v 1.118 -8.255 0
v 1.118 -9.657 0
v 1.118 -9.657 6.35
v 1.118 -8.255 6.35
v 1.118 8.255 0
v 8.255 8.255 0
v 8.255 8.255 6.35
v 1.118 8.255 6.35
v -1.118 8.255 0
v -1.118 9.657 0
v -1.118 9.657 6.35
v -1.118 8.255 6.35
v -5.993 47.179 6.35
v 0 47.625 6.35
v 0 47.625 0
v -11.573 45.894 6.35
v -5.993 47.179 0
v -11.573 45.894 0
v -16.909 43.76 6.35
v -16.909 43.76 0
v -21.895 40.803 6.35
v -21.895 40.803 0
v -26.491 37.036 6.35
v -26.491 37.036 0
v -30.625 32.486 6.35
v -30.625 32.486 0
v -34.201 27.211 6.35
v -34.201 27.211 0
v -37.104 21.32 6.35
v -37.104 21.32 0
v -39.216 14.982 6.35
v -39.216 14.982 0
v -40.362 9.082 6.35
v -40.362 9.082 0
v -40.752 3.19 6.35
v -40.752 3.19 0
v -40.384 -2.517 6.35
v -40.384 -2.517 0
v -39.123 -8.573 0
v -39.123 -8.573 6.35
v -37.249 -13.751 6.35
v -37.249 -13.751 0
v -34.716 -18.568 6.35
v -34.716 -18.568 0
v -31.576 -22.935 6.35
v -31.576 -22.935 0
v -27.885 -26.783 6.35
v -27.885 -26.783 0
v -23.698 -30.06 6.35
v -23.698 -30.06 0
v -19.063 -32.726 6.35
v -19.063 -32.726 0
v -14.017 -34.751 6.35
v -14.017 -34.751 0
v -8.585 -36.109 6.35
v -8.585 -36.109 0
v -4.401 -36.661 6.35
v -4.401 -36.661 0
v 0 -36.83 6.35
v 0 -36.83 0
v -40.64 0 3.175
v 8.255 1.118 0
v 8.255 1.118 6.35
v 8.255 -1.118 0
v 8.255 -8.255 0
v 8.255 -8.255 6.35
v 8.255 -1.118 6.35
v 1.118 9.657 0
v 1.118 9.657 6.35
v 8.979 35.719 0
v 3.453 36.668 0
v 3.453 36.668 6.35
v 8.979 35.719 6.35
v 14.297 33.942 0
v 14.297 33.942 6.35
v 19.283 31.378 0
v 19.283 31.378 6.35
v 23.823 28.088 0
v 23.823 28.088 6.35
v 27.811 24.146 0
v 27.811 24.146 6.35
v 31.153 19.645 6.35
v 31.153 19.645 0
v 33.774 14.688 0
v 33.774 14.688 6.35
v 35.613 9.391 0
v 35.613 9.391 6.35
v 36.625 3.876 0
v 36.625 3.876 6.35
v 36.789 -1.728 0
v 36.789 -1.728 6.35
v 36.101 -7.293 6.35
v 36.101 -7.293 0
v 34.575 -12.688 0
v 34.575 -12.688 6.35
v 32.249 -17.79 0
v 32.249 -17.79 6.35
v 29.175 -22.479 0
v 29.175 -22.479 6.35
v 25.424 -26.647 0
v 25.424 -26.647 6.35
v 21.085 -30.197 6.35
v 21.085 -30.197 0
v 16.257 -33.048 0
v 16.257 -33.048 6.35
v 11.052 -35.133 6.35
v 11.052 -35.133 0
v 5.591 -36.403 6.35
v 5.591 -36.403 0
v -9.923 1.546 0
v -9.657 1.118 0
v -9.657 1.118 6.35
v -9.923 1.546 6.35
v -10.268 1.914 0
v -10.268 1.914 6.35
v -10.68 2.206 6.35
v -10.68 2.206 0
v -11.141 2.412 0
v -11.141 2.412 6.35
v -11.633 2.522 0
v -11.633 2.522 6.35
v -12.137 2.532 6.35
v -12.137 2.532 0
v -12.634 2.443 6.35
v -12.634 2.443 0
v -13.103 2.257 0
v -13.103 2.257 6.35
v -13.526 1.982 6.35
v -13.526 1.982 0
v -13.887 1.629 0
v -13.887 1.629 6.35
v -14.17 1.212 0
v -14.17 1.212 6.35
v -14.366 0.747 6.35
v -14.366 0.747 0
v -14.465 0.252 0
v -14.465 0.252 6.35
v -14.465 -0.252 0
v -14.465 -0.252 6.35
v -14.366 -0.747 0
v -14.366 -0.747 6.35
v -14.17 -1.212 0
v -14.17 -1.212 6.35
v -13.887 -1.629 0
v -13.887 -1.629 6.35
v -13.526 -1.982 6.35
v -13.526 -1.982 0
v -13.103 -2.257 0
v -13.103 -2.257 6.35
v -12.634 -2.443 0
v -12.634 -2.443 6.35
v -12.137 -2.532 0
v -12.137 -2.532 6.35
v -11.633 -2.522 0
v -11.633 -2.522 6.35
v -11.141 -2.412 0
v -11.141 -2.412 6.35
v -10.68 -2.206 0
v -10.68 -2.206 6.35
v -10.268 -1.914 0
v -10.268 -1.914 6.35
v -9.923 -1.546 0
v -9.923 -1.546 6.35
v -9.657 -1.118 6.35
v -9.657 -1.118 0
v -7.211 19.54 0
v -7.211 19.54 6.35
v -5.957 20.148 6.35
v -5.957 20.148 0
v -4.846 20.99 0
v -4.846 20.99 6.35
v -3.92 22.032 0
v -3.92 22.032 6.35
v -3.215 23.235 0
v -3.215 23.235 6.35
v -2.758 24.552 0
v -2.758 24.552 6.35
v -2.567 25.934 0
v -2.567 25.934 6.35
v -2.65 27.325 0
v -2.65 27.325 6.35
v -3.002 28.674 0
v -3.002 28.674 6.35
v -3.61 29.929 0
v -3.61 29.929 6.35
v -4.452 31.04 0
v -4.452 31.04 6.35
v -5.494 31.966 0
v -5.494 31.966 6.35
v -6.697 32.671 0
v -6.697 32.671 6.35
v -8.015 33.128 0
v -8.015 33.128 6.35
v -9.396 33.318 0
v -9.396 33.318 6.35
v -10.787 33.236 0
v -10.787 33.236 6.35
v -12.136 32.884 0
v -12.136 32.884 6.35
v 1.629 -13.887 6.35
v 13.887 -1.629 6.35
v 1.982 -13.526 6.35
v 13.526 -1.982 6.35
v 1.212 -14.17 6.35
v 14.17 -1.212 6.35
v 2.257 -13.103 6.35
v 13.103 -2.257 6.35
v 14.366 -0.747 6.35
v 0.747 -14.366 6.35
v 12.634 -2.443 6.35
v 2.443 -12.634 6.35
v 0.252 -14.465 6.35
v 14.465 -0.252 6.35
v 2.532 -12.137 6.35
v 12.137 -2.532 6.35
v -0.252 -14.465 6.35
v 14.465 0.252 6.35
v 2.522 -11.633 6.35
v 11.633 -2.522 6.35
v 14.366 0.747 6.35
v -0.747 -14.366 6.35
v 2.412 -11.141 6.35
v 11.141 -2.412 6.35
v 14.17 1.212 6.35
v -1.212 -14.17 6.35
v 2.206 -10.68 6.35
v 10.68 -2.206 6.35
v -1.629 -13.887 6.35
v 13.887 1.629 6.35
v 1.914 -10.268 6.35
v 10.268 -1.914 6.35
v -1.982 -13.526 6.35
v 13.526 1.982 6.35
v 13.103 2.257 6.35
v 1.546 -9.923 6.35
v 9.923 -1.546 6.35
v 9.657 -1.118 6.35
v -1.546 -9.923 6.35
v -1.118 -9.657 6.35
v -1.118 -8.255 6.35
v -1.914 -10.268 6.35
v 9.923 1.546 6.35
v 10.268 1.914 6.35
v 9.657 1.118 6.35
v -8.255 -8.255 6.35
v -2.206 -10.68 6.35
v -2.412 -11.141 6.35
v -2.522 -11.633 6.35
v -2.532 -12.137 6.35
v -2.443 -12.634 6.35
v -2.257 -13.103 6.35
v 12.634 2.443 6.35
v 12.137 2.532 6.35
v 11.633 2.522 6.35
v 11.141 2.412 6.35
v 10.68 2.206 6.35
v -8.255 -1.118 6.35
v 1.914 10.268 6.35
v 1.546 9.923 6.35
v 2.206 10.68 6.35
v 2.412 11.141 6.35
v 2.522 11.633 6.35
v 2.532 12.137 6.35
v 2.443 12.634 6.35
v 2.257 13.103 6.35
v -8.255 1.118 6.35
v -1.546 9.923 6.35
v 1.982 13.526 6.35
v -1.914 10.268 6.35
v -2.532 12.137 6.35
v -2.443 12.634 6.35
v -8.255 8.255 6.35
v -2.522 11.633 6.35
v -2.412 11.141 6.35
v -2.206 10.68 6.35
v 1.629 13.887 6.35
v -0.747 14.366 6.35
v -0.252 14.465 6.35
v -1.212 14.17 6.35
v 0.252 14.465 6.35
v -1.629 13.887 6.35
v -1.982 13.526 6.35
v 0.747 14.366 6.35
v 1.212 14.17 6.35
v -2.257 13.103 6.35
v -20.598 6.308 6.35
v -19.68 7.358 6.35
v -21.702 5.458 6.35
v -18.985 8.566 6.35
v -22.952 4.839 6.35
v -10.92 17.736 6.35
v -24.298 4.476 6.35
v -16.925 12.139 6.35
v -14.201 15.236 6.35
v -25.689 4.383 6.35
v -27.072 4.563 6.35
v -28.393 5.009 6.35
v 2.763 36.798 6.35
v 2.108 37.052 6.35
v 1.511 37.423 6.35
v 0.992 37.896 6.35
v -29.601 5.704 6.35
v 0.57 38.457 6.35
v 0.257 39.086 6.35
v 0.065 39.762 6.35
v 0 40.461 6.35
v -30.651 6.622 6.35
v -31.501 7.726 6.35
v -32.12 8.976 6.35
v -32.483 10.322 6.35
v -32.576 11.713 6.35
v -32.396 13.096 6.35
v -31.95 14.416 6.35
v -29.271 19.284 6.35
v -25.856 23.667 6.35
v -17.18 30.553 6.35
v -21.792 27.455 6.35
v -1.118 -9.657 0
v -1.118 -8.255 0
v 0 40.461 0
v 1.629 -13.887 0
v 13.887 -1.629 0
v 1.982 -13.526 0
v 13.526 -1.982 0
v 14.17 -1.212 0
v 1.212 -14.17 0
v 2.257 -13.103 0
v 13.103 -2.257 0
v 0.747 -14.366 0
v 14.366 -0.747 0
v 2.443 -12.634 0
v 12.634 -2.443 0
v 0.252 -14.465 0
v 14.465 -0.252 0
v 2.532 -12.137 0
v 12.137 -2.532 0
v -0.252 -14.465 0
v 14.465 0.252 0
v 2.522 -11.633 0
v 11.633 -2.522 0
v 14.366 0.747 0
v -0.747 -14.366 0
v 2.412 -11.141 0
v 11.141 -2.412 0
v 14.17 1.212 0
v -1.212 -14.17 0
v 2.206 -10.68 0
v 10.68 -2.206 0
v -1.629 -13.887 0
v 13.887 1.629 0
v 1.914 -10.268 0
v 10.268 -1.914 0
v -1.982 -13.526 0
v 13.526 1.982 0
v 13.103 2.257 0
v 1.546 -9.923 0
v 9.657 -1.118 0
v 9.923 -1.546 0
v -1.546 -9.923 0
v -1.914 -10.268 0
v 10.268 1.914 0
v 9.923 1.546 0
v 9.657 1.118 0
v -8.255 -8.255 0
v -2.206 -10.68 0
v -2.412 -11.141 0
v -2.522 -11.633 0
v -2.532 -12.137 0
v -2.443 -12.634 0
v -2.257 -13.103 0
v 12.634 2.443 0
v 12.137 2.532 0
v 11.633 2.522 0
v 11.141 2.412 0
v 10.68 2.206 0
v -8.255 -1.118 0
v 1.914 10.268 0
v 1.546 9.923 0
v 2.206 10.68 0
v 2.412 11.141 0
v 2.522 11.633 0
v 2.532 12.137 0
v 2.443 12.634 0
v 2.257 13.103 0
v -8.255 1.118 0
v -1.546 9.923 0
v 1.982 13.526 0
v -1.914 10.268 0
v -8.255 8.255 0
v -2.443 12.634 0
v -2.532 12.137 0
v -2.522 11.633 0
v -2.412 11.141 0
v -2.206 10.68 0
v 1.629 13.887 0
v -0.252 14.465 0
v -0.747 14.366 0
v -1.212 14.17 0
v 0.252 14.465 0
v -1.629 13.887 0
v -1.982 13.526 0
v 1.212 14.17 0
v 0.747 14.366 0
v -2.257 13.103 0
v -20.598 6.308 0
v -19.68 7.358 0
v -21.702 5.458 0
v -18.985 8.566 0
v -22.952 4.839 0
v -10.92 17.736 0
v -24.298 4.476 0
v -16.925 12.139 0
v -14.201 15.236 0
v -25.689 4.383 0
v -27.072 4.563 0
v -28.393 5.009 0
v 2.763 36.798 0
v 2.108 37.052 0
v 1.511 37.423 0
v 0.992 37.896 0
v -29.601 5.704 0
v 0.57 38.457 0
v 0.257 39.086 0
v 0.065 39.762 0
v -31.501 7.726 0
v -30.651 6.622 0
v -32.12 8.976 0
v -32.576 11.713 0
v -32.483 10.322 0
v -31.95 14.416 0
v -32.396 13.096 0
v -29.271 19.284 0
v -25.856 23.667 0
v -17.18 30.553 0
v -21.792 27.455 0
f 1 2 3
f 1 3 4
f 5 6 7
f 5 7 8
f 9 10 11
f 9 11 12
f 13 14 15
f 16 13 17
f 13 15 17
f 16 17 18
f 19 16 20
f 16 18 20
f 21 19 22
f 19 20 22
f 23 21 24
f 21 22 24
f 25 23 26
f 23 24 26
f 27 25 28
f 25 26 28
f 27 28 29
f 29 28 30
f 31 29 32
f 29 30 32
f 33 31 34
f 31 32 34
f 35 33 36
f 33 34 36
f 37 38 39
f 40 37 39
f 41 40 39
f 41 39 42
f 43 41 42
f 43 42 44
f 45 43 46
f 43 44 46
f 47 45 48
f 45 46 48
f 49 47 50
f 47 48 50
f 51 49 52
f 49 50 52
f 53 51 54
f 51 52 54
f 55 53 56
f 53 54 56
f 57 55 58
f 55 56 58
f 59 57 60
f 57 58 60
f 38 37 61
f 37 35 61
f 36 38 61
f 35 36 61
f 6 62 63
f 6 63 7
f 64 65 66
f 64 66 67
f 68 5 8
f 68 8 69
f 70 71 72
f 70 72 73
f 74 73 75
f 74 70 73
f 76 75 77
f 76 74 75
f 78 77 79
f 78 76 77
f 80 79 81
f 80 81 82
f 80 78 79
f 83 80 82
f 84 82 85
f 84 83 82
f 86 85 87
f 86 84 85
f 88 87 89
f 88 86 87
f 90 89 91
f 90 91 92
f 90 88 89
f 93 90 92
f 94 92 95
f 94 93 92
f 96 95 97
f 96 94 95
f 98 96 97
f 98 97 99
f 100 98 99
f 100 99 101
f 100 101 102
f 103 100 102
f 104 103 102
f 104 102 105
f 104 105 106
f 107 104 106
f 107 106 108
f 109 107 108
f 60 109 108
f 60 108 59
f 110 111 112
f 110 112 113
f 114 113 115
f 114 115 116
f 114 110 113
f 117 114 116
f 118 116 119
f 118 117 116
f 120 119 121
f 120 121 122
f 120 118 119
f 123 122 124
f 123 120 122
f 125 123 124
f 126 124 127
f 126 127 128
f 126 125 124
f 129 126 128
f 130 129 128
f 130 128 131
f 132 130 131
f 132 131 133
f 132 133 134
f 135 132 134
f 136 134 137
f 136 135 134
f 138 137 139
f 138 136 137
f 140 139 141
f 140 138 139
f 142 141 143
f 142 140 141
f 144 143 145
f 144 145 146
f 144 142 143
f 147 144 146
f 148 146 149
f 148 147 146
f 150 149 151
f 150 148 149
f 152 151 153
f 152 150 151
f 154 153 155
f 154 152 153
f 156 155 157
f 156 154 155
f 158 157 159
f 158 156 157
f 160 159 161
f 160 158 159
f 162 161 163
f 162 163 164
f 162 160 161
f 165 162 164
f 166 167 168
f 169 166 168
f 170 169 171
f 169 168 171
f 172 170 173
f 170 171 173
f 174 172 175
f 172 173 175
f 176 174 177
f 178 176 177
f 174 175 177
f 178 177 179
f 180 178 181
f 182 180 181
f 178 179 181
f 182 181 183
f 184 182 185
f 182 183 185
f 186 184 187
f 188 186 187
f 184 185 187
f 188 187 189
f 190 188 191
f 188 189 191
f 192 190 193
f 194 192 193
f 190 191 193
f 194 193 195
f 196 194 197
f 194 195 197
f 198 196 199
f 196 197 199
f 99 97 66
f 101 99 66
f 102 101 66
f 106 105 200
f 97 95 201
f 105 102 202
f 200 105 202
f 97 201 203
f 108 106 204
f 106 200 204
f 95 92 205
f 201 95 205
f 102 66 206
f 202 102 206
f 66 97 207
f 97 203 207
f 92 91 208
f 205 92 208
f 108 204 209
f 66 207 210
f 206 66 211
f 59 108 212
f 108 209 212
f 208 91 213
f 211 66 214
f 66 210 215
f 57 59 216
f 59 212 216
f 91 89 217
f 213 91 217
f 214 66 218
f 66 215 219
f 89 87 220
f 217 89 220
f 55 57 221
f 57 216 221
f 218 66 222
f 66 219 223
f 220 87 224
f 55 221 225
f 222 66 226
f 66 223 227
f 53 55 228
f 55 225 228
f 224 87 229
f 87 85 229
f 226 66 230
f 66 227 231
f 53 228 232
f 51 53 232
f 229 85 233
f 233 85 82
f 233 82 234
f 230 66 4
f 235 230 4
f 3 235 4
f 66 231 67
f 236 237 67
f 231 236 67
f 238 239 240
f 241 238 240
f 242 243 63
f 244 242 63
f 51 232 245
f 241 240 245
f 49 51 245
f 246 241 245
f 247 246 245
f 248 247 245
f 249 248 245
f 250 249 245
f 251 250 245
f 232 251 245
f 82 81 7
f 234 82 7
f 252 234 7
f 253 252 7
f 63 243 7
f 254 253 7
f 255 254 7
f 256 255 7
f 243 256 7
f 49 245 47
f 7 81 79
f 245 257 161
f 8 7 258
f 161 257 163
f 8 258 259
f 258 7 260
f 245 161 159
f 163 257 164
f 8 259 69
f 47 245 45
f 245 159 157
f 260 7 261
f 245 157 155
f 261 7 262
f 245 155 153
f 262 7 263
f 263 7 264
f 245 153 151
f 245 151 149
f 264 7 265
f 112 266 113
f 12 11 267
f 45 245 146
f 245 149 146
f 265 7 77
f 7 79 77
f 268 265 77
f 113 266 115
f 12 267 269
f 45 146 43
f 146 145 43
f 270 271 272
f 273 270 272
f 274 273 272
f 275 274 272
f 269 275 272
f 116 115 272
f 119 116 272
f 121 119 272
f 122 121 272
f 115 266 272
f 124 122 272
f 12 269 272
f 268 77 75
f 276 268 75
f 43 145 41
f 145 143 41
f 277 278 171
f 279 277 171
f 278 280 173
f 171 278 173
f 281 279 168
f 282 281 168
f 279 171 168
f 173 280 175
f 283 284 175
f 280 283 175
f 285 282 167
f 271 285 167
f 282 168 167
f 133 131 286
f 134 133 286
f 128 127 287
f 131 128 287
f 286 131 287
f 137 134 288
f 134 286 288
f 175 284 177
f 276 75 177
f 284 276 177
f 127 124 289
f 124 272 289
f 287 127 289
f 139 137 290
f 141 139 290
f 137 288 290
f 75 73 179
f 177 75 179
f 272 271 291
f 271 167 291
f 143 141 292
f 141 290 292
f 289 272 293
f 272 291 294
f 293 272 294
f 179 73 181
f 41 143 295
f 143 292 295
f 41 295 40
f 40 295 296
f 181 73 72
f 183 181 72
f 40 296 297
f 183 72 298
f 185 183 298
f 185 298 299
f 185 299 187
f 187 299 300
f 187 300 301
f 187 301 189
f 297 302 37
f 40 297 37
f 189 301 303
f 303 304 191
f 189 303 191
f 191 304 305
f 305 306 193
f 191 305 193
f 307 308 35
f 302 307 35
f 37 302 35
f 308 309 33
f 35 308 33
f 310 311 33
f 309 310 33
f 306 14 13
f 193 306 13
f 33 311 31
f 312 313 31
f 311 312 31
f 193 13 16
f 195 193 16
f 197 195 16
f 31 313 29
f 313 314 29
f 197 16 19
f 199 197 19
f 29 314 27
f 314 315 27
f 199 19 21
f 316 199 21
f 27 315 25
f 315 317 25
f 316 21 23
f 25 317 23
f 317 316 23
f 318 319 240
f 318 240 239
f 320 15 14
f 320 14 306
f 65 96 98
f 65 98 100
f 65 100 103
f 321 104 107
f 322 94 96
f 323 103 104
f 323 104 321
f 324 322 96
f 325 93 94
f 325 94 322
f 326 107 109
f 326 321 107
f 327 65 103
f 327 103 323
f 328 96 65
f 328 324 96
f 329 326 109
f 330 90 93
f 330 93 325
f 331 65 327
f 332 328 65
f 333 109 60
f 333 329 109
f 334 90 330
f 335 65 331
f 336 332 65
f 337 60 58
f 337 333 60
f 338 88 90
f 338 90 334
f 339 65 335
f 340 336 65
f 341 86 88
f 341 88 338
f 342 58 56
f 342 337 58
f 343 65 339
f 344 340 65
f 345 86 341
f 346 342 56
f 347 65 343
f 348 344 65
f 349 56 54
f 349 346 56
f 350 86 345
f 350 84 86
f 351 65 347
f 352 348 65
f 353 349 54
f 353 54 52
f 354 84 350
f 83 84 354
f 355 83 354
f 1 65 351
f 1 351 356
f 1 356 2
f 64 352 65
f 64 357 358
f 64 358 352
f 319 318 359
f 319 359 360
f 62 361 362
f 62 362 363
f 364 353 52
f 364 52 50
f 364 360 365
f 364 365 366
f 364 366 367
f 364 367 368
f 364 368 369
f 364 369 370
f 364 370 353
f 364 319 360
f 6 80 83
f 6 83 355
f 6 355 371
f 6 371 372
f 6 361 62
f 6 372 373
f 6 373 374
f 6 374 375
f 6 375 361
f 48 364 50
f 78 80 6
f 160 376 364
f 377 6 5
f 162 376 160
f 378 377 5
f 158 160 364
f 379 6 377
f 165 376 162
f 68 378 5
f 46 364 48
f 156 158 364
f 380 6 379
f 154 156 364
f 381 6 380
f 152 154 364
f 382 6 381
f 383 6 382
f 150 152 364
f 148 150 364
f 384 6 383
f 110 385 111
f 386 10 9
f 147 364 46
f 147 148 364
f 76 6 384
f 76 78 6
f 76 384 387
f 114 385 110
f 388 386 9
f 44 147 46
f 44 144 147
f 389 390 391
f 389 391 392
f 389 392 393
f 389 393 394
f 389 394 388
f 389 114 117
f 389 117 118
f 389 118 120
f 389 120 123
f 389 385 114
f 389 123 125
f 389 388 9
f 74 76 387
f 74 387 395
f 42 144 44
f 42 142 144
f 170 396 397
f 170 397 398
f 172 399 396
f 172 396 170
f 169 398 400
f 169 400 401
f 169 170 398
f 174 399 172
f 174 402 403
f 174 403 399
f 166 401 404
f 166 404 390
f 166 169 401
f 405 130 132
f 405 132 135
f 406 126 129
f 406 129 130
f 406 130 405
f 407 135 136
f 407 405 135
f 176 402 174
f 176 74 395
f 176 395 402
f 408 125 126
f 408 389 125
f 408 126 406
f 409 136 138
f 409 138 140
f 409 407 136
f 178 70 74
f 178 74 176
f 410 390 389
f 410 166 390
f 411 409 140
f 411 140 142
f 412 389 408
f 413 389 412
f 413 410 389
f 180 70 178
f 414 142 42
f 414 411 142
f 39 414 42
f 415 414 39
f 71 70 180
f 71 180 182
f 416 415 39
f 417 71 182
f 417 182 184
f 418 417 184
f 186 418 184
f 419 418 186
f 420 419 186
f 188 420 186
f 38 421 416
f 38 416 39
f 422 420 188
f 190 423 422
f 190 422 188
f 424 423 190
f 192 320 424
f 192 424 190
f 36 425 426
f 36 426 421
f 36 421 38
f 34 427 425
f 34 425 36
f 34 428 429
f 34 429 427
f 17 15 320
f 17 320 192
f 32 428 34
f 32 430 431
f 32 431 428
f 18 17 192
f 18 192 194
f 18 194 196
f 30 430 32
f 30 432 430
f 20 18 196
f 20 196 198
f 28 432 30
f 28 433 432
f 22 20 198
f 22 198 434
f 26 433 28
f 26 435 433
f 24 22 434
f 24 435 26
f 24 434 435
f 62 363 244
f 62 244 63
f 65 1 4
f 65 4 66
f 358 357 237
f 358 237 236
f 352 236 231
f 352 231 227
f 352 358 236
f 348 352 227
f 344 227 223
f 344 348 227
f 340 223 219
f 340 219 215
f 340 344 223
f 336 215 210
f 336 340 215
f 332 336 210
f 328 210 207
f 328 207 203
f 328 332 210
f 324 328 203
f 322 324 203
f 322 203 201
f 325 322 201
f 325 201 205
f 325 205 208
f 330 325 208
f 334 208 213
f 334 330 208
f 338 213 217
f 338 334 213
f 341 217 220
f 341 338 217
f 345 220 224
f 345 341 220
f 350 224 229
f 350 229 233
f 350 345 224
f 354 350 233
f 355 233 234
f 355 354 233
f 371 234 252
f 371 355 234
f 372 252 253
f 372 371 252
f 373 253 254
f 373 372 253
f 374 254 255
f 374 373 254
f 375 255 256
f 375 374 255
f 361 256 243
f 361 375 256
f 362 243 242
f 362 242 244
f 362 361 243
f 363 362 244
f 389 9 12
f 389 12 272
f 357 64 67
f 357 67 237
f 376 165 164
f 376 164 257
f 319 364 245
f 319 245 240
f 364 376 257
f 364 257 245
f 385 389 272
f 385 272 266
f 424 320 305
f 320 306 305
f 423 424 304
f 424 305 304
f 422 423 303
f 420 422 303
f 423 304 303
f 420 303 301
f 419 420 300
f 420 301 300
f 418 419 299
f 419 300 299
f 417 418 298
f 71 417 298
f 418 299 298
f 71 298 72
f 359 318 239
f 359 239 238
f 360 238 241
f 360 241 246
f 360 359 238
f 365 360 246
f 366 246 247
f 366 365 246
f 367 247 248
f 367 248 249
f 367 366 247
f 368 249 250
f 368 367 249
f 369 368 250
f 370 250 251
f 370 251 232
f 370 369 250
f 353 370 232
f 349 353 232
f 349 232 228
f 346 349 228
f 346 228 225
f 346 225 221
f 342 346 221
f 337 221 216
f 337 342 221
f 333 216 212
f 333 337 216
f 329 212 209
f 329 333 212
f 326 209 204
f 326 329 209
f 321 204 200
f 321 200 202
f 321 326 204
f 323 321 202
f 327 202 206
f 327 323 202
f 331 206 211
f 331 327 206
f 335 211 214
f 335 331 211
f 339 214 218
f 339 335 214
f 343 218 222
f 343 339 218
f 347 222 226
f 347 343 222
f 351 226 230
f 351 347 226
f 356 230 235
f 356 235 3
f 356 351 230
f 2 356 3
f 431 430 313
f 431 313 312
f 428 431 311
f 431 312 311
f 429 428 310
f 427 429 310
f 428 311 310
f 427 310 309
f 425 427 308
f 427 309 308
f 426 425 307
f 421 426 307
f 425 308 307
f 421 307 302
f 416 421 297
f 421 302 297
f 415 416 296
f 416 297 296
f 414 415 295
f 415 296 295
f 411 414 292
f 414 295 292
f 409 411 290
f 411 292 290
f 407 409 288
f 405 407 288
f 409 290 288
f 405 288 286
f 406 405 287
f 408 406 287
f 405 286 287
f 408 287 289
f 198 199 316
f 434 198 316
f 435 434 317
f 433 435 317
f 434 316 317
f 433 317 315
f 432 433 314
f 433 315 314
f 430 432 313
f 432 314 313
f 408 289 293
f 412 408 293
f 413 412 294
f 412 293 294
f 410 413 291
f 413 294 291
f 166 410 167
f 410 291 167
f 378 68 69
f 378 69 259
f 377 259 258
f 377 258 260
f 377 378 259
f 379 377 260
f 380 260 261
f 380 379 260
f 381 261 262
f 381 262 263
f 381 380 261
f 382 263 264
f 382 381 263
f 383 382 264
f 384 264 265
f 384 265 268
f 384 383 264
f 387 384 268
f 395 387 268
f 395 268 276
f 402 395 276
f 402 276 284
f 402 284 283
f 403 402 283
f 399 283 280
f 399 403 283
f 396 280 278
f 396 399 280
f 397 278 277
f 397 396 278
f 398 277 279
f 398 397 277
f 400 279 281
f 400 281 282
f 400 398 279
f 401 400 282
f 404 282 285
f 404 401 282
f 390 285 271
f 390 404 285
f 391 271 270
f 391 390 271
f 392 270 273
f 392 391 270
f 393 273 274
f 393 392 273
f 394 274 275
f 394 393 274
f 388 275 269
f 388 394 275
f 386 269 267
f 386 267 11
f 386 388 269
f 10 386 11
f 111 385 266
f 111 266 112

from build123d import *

# Parameters (mm, degrees)
BOSS_EXTRUDE1_DEPTH = 6.35
CUT_EXTRUDE1_DEPTH  = 64.001230115
FILLET2_R           = 3.81


with BuildPart() as part:
    # Sketch1 → Boss-Extrude1 (new body)
    with BuildSketch(Plane.XY):
        with BuildLine():
            Line((0, 47.625), (0, 36.83))
            ThreePointArc((0, 36.83), (36.83, 0), (0, -36.83))
            add(Edge.make_bspline(
                [(0, 47.625), (-26.600153249, 47.625), (-56.149642057, -0.404637175), (-24.15519568, -36.984078787), (0, -36.83)],
                knots=[0, 0, 0, 0, 0.529165327, 1, 1, 1, 1], degree=3))
        make_face()
        with BuildLine():
            Line((1.1176, -8.255), (8.255, -8.255))
            Line((8.255, -8.255), (8.255, -1.1176))
            Line((8.255, -1.1176), (9.657085657, -1.1176))
            ThreePointArc((9.657085657, -1.1176), (14.478, 0), (9.657085657, 1.1176))
            Line((9.657085657, 1.1176), (8.255, 1.1176))
            Line((8.255, 1.1176), (8.255, 8.255))
            Line((8.255, 8.255), (1.1176, 8.255))
            Line((1.1176, 8.255), (1.1176, 9.657085657))
            ThreePointArc((1.1176, 9.657085657), (0, 14.478), (-1.1176, 9.657085657))
            Line((-1.1176, 9.657085657), (-1.1176, 8.255))
            Line((-1.1176, 8.255), (-8.255, 8.255))
            Line((-8.255, 8.255), (-8.255, 1.1176))
            Line((-8.255, 1.1176), (-9.657085657, 1.1176))
            ThreePointArc((-9.657085657, 1.1176), (-14.478, 0), (-9.657085657, -1.1176))
            Line((-9.657085657, -1.1176), (-8.255, -1.1176))
            Line((-8.255, -1.1176), (-8.255, -8.255))
            Line((-8.255, -8.255), (-1.1176, -8.255))
            Line((-1.1176, -8.255), (-1.1176, -9.657085657))
            ThreePointArc((-1.1176, -9.657085657), (0, -14.478), (1.1176, -9.657085657))
            Line((1.1176, -9.657085657), (1.1176, -8.255))
        make_face(mode=Mode.SUBTRACT)
    extrude(amount=BOSS_EXTRUDE1_DEPTH)

    # Sketch5 → Cut-Extrude1 (cut, through all)
    with BuildSketch(Plane.XY.offset(6.35)):
        with BuildLine():
            ThreePointArc((-12.136378722, 32.883902073), (-23.899090909, 25.641297895), (-31.950108913, 14.416422734))
            ThreePointArc((-31.950108913, 14.416422734), (-28.392549398, 5.00872066), (-18.984847325, 8.566280175))
            ThreePointArc((-18.984847325, 8.566280175), (-14.200909091, 15.236133532), (-7.211471414, 19.539709927))
            ThreePointArc((-7.211471414, 19.539709927), (-3.001828995, 28.674259654), (-12.136378722, 32.883902073))
        make_face()
    extrude(amount=-CUT_EXTRUDE1_DEPTH, mode=Mode.SUBTRACT)

    # Fillet2
    fillet2_edges = [part.edges().sort_by_distance(p)[0] for p in [
        (0, 36.83, 3.175),
    ]]
    fillet(fillet2_edges, radius=FILLET2_R)


solid = part.part
